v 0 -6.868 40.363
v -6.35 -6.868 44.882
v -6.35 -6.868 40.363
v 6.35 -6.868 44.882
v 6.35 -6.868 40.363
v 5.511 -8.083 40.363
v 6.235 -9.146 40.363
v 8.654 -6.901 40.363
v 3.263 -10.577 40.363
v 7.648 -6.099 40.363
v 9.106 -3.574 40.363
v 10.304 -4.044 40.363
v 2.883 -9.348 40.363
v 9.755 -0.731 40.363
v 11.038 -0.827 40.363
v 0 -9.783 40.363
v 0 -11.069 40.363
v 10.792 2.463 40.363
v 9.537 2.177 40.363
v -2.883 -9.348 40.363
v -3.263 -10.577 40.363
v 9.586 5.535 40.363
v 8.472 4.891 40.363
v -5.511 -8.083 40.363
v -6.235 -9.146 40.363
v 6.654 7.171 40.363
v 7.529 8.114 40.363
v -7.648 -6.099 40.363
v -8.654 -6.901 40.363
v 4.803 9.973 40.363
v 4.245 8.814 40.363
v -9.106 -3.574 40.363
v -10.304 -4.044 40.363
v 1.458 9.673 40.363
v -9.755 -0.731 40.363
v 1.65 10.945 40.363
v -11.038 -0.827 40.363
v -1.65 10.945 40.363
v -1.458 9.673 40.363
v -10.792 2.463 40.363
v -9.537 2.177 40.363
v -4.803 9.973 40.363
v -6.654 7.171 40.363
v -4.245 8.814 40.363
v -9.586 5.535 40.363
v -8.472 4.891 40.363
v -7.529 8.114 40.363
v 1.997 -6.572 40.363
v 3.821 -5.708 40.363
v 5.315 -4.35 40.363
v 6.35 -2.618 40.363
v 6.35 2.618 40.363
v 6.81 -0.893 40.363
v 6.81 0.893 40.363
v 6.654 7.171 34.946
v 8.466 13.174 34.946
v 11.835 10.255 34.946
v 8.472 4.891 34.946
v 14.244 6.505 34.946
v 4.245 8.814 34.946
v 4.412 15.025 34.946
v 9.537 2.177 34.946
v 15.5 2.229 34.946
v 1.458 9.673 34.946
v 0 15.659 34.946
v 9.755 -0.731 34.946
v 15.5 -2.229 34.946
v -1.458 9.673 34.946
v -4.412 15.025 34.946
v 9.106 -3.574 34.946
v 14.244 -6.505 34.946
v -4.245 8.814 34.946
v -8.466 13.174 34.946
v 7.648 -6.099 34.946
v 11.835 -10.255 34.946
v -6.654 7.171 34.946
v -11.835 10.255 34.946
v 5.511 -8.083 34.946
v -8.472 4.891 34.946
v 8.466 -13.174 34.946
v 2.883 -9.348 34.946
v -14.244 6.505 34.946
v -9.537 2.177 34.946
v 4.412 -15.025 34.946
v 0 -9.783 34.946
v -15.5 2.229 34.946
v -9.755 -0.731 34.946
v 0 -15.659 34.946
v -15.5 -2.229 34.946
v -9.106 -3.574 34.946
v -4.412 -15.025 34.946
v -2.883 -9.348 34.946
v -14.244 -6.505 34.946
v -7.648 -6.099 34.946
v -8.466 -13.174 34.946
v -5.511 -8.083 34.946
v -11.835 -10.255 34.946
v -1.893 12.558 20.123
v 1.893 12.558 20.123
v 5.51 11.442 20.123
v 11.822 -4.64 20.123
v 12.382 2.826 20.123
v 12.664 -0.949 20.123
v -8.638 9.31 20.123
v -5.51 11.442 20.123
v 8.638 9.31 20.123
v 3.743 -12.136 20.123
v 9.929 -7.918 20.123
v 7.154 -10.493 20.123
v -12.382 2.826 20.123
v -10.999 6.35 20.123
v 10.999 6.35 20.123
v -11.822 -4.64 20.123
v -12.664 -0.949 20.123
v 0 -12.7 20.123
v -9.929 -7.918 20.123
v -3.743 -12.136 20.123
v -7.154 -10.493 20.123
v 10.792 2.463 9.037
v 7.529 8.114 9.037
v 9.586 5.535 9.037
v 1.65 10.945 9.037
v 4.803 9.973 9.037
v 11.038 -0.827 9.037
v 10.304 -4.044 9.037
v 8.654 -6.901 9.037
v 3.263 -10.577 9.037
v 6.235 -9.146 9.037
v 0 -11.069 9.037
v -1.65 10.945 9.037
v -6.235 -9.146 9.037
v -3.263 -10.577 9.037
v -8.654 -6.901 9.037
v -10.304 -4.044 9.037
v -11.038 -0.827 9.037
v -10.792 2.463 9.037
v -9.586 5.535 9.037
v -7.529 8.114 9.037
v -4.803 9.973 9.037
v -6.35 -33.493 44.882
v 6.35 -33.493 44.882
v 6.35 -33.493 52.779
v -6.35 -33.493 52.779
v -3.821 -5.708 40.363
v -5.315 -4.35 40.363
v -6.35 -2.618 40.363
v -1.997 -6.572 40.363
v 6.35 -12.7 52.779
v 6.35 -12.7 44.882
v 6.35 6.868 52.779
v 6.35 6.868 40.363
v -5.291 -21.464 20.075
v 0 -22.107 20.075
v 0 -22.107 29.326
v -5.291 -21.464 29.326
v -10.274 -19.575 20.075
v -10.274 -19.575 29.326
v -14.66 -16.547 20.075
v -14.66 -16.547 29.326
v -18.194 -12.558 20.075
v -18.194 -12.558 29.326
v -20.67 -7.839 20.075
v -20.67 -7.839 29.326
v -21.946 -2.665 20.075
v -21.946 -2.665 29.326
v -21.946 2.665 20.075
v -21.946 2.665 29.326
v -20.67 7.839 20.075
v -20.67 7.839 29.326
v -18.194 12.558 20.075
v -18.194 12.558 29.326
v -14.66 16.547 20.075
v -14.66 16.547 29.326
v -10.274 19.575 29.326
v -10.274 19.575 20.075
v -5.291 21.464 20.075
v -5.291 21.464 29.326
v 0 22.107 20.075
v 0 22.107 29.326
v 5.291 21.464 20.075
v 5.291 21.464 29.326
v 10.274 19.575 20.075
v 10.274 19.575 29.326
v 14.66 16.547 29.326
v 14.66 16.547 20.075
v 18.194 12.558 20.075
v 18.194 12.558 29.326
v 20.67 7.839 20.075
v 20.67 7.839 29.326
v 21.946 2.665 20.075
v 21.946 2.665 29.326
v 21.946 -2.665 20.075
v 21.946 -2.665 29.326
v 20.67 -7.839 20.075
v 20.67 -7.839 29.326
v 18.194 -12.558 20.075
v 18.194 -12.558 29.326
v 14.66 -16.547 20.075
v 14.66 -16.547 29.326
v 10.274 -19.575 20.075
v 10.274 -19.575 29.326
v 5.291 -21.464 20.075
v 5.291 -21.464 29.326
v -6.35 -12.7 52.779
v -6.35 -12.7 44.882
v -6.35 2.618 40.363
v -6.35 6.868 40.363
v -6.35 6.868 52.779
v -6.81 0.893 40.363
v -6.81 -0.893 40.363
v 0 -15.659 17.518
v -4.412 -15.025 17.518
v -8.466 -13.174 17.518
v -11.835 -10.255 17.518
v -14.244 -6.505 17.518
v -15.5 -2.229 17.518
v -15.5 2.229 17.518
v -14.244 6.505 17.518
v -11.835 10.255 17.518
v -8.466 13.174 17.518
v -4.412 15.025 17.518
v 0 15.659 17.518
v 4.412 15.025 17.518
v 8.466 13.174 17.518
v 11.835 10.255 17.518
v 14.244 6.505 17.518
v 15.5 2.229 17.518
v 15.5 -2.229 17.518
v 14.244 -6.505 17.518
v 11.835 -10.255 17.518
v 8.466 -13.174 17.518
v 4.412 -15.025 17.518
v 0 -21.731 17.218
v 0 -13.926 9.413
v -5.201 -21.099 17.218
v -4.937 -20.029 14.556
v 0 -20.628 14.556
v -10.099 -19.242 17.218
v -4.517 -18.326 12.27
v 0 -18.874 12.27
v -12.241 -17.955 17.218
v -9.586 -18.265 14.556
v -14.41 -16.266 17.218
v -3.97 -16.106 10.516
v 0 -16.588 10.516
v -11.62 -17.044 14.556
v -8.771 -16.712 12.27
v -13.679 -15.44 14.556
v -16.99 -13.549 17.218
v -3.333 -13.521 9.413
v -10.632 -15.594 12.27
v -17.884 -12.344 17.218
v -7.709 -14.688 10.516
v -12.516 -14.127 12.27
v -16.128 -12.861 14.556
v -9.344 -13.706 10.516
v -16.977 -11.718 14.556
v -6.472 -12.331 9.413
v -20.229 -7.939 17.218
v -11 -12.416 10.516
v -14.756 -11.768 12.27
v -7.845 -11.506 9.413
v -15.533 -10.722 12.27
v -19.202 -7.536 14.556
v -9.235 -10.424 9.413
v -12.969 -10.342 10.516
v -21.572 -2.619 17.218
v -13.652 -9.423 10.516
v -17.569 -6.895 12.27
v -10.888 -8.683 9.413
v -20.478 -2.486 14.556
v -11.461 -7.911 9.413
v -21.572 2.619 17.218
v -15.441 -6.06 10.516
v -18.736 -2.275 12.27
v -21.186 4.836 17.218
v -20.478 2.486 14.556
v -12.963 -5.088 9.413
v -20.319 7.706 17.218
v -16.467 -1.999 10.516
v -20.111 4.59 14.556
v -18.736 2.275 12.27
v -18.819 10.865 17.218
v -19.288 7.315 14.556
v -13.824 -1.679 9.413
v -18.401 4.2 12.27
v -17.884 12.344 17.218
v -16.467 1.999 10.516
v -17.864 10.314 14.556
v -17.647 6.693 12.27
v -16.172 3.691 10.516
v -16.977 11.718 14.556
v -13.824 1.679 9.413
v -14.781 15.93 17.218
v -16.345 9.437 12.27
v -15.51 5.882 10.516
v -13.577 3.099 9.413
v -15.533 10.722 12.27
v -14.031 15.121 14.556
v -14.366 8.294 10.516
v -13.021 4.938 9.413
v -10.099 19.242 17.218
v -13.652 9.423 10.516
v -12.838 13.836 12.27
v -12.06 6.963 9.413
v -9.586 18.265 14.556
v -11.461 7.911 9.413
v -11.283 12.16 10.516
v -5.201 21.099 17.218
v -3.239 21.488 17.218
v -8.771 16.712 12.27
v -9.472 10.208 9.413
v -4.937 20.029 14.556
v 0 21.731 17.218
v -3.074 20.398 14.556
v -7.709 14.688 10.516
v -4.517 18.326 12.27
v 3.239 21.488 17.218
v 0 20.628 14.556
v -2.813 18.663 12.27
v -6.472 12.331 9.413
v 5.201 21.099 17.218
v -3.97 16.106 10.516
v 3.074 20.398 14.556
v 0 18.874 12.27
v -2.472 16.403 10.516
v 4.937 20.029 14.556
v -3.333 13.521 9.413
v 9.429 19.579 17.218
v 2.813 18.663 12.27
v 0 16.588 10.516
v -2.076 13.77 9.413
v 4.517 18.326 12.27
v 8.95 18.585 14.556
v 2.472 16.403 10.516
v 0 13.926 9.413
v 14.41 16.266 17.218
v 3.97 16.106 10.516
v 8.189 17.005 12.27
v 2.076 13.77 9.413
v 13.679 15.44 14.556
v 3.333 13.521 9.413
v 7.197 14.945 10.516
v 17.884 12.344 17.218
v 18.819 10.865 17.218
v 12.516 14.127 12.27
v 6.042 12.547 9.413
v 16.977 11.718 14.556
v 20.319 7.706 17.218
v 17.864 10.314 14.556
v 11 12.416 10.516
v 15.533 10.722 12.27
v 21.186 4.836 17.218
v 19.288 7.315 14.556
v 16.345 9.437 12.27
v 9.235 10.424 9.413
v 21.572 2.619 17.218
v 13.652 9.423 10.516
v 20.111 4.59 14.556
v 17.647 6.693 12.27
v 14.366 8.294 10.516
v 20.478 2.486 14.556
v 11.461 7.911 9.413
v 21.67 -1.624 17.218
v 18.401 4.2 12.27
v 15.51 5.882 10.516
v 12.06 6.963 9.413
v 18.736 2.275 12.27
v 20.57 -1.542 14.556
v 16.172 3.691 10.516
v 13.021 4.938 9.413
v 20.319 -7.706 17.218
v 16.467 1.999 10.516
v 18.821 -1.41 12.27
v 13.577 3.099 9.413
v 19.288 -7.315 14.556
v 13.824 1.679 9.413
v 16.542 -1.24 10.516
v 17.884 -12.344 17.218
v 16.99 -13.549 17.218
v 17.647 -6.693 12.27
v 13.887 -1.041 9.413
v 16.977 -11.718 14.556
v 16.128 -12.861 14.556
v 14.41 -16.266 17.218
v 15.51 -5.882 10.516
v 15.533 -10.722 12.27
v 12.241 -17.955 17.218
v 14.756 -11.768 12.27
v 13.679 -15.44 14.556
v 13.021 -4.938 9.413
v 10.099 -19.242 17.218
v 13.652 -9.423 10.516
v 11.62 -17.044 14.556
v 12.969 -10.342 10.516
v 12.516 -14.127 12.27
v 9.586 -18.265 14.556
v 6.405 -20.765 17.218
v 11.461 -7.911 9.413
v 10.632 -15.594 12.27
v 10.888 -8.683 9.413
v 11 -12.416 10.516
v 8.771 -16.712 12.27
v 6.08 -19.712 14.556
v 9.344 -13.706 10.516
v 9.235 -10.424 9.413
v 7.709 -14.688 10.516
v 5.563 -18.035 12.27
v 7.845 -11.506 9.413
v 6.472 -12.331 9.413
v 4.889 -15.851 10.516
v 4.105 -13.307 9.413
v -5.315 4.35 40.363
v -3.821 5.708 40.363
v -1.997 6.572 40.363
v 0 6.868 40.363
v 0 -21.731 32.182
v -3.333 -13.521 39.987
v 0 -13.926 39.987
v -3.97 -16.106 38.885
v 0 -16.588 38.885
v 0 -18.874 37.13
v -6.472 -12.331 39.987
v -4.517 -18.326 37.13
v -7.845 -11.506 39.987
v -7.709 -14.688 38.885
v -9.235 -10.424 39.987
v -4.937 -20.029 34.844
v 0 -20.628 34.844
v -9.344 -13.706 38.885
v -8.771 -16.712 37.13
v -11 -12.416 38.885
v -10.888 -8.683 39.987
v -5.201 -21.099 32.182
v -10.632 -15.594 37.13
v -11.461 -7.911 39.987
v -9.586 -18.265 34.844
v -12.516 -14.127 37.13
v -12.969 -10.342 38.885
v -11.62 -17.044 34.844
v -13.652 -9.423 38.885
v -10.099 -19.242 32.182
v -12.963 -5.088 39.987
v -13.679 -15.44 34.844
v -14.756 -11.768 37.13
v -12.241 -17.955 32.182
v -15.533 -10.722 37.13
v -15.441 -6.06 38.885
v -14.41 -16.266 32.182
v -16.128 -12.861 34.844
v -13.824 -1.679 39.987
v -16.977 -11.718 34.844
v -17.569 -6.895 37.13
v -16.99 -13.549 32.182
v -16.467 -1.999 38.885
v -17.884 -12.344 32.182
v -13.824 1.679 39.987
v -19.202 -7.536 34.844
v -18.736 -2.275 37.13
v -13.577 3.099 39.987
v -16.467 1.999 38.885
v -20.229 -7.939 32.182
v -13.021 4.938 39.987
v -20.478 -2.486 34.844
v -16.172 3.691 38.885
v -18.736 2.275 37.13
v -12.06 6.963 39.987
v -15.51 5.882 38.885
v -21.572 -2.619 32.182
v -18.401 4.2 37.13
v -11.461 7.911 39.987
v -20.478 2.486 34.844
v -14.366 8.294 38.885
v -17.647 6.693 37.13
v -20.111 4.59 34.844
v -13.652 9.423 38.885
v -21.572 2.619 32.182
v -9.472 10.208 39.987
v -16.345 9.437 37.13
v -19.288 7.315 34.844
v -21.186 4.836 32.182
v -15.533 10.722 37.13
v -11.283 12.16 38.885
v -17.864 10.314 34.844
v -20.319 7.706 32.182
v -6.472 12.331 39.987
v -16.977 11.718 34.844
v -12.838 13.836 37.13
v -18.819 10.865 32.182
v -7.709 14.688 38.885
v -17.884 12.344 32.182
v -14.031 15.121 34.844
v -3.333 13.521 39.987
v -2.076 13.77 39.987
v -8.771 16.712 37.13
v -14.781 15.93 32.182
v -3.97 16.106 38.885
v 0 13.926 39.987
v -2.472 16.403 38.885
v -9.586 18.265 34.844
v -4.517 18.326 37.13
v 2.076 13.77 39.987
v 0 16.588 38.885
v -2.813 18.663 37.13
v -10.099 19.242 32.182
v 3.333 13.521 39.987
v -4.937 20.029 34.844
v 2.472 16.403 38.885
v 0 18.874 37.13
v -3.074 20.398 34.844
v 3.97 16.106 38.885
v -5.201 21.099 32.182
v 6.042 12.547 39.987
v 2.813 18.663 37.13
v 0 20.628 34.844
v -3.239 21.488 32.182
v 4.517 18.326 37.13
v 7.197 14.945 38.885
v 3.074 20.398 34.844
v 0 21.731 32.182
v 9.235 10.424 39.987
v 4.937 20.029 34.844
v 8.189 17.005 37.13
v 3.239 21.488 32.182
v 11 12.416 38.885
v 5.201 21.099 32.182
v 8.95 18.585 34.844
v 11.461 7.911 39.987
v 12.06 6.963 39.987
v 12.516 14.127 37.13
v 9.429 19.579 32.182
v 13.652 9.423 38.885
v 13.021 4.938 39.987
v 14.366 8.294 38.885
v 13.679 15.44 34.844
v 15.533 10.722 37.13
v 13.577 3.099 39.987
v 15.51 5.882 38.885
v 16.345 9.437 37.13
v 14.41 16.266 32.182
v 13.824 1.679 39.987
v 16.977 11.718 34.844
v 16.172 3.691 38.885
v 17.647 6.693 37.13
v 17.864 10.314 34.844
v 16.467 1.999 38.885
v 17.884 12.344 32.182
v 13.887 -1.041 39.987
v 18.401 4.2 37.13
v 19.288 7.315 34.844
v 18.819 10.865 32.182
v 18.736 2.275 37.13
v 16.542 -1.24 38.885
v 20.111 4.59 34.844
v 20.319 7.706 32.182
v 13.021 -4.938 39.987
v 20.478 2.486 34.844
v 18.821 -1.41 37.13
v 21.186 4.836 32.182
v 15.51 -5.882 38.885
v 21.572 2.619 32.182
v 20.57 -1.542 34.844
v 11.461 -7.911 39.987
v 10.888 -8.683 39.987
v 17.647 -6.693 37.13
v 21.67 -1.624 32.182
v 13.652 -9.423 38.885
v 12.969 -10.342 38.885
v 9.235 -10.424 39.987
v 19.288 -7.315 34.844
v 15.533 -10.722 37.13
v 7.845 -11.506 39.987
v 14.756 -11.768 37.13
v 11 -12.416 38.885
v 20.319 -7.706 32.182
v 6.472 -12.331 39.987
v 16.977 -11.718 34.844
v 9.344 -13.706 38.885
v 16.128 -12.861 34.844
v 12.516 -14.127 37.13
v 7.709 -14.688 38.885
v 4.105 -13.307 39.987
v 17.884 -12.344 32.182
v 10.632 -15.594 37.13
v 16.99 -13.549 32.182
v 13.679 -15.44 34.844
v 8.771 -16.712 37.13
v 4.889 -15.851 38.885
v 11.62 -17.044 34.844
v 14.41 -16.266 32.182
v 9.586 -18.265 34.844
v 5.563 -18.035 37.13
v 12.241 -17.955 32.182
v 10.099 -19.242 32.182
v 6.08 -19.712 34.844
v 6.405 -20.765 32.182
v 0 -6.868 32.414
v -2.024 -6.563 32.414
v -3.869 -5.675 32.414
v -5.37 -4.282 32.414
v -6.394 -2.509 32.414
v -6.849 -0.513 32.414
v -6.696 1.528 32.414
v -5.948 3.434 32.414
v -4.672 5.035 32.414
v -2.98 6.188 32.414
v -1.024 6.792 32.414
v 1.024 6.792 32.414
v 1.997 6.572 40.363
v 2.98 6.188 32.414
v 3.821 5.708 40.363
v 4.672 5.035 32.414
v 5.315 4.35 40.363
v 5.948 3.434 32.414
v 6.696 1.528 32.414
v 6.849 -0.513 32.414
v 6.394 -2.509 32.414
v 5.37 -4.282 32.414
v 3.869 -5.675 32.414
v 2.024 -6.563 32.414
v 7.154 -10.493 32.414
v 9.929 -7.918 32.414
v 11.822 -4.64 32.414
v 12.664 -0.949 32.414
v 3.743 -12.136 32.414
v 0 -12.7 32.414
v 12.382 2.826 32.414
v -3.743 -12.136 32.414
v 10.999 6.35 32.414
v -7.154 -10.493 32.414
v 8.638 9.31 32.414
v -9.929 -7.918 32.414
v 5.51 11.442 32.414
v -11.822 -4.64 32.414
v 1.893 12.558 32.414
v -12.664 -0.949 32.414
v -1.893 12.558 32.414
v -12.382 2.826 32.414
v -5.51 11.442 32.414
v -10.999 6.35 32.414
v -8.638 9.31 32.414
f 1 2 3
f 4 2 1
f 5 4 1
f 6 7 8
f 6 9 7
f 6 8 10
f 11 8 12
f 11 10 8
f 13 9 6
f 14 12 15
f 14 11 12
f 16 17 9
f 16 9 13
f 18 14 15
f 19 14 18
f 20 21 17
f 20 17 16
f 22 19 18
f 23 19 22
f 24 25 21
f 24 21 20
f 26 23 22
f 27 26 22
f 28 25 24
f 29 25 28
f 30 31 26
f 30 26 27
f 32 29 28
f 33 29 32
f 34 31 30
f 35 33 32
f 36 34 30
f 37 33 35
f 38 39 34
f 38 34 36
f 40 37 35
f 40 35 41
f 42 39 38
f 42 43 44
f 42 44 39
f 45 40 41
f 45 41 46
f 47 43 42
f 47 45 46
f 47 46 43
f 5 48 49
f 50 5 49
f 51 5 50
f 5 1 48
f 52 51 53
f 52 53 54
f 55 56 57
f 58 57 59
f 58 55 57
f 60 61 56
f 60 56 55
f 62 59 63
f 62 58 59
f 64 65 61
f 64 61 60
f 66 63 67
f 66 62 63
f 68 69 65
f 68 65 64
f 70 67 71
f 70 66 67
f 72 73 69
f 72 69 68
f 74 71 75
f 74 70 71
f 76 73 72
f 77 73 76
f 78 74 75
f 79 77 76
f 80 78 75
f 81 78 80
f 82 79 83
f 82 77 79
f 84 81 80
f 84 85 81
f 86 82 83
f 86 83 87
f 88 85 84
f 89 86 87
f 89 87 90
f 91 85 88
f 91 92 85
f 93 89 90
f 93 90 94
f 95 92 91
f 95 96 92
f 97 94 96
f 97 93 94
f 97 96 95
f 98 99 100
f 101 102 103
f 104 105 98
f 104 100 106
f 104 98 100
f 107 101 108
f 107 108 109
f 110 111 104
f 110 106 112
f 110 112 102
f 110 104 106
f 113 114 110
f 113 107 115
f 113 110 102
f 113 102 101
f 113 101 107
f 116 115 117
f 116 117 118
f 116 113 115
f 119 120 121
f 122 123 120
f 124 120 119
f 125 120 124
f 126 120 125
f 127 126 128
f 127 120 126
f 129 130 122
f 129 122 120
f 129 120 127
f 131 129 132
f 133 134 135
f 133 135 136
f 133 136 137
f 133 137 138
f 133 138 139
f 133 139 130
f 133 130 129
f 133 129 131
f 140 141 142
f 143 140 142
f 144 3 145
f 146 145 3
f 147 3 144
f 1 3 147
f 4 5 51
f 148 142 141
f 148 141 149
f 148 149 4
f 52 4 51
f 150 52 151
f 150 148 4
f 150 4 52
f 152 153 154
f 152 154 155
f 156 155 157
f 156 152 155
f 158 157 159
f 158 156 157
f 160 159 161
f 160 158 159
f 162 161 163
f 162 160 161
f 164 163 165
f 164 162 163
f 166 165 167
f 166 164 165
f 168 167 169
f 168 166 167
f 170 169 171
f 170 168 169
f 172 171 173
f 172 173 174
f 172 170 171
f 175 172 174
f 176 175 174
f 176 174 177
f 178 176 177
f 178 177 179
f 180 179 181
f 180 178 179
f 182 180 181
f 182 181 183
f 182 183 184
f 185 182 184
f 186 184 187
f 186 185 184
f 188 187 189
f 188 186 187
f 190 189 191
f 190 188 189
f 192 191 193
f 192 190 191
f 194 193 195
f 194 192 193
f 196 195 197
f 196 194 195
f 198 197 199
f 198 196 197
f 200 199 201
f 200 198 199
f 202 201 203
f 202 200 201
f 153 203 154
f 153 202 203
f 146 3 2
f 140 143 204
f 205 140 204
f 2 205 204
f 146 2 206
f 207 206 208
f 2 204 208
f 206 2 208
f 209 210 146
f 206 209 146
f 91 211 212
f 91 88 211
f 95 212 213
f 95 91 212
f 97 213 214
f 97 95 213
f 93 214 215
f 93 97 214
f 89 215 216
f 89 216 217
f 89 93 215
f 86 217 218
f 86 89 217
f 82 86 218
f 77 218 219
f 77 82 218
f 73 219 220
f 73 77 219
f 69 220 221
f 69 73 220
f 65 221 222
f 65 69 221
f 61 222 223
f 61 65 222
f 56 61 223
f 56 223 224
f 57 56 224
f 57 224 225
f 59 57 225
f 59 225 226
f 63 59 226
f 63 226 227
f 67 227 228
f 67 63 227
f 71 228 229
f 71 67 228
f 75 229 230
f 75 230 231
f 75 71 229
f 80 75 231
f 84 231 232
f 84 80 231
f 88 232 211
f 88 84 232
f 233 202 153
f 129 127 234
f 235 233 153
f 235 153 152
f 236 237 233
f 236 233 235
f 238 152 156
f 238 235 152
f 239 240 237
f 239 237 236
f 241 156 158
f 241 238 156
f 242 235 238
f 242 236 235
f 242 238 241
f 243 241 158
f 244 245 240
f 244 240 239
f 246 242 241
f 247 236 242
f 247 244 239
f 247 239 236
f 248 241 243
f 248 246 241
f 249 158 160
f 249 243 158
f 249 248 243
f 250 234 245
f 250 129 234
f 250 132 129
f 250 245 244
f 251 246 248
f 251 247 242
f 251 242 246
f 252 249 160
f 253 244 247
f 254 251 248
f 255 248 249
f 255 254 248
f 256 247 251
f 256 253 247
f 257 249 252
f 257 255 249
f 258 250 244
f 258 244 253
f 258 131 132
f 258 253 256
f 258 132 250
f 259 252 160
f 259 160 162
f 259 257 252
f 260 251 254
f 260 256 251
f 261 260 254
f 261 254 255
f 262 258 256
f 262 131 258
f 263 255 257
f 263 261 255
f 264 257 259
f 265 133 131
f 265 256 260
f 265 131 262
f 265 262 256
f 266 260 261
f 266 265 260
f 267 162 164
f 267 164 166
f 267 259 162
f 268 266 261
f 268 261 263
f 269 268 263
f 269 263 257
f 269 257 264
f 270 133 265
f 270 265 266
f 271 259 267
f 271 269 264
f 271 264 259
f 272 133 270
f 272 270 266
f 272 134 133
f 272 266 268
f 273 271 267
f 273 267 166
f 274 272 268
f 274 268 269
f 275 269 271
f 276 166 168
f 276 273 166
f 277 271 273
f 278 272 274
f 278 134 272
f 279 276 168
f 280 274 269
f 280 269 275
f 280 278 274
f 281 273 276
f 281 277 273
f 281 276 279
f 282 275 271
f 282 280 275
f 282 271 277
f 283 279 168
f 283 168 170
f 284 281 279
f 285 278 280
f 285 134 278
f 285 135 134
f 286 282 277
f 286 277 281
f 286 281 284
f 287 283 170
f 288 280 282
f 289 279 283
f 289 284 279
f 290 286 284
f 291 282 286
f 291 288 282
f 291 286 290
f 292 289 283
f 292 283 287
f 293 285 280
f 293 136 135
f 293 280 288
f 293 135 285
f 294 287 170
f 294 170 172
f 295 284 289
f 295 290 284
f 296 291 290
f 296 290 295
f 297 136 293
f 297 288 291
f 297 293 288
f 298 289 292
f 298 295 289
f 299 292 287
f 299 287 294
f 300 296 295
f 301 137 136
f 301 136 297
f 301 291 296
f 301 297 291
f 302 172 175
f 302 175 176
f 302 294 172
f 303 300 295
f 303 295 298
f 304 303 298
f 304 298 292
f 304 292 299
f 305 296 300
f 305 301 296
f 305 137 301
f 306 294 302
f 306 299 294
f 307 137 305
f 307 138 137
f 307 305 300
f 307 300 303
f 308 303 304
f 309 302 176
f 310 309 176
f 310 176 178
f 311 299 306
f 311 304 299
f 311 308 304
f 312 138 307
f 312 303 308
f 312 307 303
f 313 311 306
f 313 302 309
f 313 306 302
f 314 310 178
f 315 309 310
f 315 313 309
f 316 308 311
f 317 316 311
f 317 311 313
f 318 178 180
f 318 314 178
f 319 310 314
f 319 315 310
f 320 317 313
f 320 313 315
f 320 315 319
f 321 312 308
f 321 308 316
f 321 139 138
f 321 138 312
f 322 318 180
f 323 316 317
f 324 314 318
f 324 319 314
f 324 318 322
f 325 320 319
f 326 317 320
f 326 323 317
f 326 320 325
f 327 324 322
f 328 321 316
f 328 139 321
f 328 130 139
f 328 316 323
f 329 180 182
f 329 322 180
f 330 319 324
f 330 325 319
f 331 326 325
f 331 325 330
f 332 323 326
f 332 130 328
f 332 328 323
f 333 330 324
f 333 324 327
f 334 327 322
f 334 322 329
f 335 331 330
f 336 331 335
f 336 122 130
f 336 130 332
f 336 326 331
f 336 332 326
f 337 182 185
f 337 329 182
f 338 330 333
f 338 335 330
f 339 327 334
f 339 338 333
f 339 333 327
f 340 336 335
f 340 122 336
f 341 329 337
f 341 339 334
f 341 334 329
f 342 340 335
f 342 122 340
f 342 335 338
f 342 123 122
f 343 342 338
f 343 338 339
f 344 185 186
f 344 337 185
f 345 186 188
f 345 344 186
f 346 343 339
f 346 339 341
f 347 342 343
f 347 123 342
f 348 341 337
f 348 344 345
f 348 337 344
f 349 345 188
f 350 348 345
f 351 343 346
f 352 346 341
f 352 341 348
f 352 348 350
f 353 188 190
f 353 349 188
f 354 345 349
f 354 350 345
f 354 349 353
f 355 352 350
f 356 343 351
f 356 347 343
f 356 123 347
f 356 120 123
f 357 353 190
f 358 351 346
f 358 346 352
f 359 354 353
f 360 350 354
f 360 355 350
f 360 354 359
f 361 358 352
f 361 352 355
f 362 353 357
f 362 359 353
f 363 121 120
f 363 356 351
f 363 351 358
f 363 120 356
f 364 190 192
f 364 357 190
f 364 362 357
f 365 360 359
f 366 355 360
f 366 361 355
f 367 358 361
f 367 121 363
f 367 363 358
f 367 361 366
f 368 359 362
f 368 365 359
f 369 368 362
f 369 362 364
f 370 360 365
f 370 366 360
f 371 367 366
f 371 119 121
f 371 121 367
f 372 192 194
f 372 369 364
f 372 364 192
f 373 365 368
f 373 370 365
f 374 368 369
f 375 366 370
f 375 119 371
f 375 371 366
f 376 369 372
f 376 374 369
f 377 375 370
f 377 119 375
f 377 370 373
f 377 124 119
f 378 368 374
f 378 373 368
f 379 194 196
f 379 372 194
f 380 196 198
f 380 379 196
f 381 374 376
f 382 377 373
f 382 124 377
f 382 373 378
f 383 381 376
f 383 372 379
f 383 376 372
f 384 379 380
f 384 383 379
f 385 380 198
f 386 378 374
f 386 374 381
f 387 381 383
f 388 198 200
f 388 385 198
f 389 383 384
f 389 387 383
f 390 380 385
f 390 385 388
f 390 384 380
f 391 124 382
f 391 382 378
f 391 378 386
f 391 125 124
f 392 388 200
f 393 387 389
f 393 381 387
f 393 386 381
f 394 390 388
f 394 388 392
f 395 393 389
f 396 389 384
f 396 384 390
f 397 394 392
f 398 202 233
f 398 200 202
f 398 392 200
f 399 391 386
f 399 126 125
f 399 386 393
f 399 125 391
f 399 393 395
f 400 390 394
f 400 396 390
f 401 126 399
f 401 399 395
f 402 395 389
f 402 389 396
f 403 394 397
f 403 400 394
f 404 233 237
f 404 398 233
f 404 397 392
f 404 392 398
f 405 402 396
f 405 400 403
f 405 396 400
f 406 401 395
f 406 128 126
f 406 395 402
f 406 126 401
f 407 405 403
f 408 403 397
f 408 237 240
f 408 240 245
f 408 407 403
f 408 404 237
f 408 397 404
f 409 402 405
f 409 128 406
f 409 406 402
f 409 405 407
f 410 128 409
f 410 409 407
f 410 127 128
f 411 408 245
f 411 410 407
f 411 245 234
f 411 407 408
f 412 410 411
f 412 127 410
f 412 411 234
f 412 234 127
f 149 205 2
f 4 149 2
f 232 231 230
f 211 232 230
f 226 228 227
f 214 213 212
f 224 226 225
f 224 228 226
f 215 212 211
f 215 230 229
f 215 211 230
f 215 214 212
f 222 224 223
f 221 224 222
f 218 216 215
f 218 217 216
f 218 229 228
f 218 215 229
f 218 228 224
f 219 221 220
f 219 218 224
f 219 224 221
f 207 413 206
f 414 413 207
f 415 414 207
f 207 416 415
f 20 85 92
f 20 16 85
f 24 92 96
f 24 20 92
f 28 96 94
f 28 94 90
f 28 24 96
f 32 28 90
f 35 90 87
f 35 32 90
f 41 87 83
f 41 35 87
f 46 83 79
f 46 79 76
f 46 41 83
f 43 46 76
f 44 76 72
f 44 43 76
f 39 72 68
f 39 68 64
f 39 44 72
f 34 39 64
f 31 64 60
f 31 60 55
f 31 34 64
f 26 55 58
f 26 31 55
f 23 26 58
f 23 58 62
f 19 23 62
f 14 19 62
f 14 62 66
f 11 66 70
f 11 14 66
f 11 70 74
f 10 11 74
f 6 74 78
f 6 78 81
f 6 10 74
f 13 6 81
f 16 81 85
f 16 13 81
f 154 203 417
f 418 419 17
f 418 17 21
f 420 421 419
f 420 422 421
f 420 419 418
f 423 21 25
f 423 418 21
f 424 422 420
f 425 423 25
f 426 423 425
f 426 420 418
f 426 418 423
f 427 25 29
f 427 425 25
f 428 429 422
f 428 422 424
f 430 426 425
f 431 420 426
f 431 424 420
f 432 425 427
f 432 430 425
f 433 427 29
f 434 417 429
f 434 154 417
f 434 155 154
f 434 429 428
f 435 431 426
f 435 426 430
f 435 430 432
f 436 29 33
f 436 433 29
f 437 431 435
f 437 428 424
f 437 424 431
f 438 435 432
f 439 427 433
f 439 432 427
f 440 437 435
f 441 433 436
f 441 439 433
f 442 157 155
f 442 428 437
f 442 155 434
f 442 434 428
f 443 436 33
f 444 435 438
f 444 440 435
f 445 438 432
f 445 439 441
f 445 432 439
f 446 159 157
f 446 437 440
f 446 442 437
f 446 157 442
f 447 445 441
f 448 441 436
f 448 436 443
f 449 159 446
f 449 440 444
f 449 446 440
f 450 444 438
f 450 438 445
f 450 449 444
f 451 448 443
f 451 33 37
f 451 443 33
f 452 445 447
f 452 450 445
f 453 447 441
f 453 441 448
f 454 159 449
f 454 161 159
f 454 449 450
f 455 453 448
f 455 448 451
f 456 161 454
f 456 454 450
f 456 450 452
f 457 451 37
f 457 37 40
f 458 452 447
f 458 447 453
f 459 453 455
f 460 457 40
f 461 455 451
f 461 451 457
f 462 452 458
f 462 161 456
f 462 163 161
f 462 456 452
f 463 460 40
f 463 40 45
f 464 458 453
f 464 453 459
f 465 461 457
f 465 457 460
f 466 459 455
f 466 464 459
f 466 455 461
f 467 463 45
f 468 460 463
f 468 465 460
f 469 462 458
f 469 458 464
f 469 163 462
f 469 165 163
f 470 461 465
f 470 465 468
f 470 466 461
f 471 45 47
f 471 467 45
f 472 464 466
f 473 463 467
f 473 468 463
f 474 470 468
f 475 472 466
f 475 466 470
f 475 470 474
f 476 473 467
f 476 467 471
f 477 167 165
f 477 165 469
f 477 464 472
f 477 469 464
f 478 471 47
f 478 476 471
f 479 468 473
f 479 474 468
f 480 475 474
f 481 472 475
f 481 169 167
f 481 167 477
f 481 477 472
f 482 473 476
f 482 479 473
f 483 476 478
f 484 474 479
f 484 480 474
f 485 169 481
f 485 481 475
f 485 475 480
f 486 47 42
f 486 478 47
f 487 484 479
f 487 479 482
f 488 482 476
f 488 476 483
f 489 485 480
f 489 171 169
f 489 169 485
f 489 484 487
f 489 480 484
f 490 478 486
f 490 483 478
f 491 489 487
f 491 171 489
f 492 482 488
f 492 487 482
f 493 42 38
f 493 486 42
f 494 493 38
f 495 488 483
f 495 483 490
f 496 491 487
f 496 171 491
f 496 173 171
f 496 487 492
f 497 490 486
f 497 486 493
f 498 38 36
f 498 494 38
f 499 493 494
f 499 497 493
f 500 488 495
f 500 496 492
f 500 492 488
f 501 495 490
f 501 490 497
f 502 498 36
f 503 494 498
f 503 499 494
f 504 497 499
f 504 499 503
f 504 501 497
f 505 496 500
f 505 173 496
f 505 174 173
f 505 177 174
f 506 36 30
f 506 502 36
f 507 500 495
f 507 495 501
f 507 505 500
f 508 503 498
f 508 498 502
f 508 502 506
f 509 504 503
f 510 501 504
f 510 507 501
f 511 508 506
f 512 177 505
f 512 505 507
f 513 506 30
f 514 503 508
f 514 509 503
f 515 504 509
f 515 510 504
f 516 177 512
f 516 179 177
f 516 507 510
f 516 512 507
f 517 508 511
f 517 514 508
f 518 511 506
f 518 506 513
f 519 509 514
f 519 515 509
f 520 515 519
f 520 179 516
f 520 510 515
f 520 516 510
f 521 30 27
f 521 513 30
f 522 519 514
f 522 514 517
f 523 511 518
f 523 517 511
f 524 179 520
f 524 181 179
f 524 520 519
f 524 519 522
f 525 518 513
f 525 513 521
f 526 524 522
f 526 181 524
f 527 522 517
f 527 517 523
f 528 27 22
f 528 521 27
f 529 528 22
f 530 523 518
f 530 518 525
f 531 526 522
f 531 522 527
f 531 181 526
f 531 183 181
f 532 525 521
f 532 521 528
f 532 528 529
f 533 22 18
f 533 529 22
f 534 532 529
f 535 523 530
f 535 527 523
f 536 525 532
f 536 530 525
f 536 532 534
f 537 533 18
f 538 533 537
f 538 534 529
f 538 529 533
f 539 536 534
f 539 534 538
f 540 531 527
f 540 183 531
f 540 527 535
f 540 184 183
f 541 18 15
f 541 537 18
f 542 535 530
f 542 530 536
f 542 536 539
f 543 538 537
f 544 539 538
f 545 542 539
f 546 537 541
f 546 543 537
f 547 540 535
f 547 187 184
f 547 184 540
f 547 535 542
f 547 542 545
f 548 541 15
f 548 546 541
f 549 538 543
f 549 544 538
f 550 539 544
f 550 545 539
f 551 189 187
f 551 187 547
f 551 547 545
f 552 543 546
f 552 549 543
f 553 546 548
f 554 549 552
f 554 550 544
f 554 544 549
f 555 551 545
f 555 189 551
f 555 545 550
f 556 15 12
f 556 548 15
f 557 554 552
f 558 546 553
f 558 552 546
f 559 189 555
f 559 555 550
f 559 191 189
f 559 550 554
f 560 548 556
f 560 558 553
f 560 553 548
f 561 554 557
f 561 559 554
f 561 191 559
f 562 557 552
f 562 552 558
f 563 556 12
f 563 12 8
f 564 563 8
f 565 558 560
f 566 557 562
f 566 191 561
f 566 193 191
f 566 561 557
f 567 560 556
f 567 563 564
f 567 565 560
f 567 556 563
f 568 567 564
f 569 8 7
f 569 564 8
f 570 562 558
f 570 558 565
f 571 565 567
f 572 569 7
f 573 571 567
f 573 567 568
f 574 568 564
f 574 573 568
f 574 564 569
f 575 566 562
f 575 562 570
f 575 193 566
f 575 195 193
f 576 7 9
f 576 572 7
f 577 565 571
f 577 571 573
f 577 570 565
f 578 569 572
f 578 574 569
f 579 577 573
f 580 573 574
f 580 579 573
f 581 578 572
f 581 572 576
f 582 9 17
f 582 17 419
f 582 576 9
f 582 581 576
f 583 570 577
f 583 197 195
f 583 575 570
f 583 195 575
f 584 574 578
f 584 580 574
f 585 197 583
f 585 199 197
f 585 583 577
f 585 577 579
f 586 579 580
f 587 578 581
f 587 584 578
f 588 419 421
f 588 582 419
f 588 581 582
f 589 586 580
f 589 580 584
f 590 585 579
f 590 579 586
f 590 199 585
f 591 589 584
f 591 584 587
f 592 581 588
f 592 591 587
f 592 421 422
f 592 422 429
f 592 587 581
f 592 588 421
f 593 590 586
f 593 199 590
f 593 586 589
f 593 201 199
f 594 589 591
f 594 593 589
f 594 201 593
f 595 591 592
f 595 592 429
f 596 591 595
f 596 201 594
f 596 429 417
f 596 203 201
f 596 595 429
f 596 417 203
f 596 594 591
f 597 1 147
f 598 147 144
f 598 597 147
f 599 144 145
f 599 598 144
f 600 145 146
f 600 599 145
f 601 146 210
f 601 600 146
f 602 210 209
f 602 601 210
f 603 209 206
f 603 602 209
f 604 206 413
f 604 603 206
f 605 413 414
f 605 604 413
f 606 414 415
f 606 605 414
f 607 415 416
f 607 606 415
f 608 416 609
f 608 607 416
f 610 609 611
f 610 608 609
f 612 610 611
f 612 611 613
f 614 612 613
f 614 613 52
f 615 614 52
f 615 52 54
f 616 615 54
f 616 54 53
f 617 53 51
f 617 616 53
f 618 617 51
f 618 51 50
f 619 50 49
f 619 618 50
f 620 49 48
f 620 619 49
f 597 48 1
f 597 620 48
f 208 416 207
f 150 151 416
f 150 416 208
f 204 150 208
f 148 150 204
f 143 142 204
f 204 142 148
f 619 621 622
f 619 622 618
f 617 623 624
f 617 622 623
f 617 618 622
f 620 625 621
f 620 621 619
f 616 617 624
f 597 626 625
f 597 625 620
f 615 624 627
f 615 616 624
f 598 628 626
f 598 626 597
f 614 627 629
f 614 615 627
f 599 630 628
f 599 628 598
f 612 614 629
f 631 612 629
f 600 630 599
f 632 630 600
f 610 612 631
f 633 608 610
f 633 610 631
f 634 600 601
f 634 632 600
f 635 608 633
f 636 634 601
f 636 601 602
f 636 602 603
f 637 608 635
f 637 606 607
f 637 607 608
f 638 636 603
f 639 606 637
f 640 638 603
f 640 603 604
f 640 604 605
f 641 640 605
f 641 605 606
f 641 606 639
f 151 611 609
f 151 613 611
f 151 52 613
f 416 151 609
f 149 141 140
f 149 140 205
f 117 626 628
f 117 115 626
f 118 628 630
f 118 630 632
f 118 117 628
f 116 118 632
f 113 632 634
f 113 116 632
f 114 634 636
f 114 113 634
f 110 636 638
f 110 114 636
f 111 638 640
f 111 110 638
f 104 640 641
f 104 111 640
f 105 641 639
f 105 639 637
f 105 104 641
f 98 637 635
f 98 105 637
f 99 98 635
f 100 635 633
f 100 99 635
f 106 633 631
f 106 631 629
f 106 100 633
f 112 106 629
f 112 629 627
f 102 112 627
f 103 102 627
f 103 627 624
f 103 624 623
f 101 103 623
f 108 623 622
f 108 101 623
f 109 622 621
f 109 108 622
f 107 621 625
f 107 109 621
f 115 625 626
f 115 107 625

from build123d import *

# Parameters (mm, degrees)
F0_W     = 12.7
F0_H     = 8.480302
F0_W_2   = 2.917401
F0_H_2   = 5.417818
F0_W_3   = 20.792763
F0_H_3   = 7.896875
F2_DEPTH = 6.35
F3_R     = 11.037784


with BuildPart() as f1:
    # F0 (on Right) → F1 (revolve)
    with BuildSketch(Plane.YZ):
        with Locations((-6.35, 13.277427)):
            Rectangle(F0_W, F0_H)
        Polygon((0, 20.122999), (0, 40.36338), (-6.868331, 40.36338), (-6.868331, 32.413691), (-12.7, 32.413691), (-12.7, 20.122999), align=None)
        with Locations((-11.2413, 37.654471)):
            Rectangle(F0_W_2, F0_H_2)
        Polygon((-12.7, 34.945562), (-12.7, 40.36338), (-22.106865, 40.36338), (-22.106865, 9.037276), (-12.7, 9.037276), (-12.7, 17.517578), (-15.659478, 17.517578), (-15.659478, 34.945562), align=None)
    revolve(axis=Axis((0, 0, 24.700328), (0, 0, -1)))

    # F0 (on Right) → F2 (join, symmetric)
    with BuildSketch(Plane.YZ):
        Polygon((0, 40.36338), (6.868331, 40.36338), (6.868331, 52.778893), (-12.7, 52.778893), (-12.7, 44.882018), (-6.868331, 44.882018), (-6.868331, 40.36338), align=None)
        with Locations((-23.096381, 48.830455)):
            Rectangle(F0_W_3, F0_H_3)
    extrude(amount=F2_DEPTH, both=True)

    # F3
    f3_edges = [f1.edges().sort_by_distance(p)[0] for p in [
        (0, 22.106865, 9.037276),
        (0, 22.106865, 40.36338),
    ]]
    fillet(f3_edges, radius=F3_R)


solid = f1.part
